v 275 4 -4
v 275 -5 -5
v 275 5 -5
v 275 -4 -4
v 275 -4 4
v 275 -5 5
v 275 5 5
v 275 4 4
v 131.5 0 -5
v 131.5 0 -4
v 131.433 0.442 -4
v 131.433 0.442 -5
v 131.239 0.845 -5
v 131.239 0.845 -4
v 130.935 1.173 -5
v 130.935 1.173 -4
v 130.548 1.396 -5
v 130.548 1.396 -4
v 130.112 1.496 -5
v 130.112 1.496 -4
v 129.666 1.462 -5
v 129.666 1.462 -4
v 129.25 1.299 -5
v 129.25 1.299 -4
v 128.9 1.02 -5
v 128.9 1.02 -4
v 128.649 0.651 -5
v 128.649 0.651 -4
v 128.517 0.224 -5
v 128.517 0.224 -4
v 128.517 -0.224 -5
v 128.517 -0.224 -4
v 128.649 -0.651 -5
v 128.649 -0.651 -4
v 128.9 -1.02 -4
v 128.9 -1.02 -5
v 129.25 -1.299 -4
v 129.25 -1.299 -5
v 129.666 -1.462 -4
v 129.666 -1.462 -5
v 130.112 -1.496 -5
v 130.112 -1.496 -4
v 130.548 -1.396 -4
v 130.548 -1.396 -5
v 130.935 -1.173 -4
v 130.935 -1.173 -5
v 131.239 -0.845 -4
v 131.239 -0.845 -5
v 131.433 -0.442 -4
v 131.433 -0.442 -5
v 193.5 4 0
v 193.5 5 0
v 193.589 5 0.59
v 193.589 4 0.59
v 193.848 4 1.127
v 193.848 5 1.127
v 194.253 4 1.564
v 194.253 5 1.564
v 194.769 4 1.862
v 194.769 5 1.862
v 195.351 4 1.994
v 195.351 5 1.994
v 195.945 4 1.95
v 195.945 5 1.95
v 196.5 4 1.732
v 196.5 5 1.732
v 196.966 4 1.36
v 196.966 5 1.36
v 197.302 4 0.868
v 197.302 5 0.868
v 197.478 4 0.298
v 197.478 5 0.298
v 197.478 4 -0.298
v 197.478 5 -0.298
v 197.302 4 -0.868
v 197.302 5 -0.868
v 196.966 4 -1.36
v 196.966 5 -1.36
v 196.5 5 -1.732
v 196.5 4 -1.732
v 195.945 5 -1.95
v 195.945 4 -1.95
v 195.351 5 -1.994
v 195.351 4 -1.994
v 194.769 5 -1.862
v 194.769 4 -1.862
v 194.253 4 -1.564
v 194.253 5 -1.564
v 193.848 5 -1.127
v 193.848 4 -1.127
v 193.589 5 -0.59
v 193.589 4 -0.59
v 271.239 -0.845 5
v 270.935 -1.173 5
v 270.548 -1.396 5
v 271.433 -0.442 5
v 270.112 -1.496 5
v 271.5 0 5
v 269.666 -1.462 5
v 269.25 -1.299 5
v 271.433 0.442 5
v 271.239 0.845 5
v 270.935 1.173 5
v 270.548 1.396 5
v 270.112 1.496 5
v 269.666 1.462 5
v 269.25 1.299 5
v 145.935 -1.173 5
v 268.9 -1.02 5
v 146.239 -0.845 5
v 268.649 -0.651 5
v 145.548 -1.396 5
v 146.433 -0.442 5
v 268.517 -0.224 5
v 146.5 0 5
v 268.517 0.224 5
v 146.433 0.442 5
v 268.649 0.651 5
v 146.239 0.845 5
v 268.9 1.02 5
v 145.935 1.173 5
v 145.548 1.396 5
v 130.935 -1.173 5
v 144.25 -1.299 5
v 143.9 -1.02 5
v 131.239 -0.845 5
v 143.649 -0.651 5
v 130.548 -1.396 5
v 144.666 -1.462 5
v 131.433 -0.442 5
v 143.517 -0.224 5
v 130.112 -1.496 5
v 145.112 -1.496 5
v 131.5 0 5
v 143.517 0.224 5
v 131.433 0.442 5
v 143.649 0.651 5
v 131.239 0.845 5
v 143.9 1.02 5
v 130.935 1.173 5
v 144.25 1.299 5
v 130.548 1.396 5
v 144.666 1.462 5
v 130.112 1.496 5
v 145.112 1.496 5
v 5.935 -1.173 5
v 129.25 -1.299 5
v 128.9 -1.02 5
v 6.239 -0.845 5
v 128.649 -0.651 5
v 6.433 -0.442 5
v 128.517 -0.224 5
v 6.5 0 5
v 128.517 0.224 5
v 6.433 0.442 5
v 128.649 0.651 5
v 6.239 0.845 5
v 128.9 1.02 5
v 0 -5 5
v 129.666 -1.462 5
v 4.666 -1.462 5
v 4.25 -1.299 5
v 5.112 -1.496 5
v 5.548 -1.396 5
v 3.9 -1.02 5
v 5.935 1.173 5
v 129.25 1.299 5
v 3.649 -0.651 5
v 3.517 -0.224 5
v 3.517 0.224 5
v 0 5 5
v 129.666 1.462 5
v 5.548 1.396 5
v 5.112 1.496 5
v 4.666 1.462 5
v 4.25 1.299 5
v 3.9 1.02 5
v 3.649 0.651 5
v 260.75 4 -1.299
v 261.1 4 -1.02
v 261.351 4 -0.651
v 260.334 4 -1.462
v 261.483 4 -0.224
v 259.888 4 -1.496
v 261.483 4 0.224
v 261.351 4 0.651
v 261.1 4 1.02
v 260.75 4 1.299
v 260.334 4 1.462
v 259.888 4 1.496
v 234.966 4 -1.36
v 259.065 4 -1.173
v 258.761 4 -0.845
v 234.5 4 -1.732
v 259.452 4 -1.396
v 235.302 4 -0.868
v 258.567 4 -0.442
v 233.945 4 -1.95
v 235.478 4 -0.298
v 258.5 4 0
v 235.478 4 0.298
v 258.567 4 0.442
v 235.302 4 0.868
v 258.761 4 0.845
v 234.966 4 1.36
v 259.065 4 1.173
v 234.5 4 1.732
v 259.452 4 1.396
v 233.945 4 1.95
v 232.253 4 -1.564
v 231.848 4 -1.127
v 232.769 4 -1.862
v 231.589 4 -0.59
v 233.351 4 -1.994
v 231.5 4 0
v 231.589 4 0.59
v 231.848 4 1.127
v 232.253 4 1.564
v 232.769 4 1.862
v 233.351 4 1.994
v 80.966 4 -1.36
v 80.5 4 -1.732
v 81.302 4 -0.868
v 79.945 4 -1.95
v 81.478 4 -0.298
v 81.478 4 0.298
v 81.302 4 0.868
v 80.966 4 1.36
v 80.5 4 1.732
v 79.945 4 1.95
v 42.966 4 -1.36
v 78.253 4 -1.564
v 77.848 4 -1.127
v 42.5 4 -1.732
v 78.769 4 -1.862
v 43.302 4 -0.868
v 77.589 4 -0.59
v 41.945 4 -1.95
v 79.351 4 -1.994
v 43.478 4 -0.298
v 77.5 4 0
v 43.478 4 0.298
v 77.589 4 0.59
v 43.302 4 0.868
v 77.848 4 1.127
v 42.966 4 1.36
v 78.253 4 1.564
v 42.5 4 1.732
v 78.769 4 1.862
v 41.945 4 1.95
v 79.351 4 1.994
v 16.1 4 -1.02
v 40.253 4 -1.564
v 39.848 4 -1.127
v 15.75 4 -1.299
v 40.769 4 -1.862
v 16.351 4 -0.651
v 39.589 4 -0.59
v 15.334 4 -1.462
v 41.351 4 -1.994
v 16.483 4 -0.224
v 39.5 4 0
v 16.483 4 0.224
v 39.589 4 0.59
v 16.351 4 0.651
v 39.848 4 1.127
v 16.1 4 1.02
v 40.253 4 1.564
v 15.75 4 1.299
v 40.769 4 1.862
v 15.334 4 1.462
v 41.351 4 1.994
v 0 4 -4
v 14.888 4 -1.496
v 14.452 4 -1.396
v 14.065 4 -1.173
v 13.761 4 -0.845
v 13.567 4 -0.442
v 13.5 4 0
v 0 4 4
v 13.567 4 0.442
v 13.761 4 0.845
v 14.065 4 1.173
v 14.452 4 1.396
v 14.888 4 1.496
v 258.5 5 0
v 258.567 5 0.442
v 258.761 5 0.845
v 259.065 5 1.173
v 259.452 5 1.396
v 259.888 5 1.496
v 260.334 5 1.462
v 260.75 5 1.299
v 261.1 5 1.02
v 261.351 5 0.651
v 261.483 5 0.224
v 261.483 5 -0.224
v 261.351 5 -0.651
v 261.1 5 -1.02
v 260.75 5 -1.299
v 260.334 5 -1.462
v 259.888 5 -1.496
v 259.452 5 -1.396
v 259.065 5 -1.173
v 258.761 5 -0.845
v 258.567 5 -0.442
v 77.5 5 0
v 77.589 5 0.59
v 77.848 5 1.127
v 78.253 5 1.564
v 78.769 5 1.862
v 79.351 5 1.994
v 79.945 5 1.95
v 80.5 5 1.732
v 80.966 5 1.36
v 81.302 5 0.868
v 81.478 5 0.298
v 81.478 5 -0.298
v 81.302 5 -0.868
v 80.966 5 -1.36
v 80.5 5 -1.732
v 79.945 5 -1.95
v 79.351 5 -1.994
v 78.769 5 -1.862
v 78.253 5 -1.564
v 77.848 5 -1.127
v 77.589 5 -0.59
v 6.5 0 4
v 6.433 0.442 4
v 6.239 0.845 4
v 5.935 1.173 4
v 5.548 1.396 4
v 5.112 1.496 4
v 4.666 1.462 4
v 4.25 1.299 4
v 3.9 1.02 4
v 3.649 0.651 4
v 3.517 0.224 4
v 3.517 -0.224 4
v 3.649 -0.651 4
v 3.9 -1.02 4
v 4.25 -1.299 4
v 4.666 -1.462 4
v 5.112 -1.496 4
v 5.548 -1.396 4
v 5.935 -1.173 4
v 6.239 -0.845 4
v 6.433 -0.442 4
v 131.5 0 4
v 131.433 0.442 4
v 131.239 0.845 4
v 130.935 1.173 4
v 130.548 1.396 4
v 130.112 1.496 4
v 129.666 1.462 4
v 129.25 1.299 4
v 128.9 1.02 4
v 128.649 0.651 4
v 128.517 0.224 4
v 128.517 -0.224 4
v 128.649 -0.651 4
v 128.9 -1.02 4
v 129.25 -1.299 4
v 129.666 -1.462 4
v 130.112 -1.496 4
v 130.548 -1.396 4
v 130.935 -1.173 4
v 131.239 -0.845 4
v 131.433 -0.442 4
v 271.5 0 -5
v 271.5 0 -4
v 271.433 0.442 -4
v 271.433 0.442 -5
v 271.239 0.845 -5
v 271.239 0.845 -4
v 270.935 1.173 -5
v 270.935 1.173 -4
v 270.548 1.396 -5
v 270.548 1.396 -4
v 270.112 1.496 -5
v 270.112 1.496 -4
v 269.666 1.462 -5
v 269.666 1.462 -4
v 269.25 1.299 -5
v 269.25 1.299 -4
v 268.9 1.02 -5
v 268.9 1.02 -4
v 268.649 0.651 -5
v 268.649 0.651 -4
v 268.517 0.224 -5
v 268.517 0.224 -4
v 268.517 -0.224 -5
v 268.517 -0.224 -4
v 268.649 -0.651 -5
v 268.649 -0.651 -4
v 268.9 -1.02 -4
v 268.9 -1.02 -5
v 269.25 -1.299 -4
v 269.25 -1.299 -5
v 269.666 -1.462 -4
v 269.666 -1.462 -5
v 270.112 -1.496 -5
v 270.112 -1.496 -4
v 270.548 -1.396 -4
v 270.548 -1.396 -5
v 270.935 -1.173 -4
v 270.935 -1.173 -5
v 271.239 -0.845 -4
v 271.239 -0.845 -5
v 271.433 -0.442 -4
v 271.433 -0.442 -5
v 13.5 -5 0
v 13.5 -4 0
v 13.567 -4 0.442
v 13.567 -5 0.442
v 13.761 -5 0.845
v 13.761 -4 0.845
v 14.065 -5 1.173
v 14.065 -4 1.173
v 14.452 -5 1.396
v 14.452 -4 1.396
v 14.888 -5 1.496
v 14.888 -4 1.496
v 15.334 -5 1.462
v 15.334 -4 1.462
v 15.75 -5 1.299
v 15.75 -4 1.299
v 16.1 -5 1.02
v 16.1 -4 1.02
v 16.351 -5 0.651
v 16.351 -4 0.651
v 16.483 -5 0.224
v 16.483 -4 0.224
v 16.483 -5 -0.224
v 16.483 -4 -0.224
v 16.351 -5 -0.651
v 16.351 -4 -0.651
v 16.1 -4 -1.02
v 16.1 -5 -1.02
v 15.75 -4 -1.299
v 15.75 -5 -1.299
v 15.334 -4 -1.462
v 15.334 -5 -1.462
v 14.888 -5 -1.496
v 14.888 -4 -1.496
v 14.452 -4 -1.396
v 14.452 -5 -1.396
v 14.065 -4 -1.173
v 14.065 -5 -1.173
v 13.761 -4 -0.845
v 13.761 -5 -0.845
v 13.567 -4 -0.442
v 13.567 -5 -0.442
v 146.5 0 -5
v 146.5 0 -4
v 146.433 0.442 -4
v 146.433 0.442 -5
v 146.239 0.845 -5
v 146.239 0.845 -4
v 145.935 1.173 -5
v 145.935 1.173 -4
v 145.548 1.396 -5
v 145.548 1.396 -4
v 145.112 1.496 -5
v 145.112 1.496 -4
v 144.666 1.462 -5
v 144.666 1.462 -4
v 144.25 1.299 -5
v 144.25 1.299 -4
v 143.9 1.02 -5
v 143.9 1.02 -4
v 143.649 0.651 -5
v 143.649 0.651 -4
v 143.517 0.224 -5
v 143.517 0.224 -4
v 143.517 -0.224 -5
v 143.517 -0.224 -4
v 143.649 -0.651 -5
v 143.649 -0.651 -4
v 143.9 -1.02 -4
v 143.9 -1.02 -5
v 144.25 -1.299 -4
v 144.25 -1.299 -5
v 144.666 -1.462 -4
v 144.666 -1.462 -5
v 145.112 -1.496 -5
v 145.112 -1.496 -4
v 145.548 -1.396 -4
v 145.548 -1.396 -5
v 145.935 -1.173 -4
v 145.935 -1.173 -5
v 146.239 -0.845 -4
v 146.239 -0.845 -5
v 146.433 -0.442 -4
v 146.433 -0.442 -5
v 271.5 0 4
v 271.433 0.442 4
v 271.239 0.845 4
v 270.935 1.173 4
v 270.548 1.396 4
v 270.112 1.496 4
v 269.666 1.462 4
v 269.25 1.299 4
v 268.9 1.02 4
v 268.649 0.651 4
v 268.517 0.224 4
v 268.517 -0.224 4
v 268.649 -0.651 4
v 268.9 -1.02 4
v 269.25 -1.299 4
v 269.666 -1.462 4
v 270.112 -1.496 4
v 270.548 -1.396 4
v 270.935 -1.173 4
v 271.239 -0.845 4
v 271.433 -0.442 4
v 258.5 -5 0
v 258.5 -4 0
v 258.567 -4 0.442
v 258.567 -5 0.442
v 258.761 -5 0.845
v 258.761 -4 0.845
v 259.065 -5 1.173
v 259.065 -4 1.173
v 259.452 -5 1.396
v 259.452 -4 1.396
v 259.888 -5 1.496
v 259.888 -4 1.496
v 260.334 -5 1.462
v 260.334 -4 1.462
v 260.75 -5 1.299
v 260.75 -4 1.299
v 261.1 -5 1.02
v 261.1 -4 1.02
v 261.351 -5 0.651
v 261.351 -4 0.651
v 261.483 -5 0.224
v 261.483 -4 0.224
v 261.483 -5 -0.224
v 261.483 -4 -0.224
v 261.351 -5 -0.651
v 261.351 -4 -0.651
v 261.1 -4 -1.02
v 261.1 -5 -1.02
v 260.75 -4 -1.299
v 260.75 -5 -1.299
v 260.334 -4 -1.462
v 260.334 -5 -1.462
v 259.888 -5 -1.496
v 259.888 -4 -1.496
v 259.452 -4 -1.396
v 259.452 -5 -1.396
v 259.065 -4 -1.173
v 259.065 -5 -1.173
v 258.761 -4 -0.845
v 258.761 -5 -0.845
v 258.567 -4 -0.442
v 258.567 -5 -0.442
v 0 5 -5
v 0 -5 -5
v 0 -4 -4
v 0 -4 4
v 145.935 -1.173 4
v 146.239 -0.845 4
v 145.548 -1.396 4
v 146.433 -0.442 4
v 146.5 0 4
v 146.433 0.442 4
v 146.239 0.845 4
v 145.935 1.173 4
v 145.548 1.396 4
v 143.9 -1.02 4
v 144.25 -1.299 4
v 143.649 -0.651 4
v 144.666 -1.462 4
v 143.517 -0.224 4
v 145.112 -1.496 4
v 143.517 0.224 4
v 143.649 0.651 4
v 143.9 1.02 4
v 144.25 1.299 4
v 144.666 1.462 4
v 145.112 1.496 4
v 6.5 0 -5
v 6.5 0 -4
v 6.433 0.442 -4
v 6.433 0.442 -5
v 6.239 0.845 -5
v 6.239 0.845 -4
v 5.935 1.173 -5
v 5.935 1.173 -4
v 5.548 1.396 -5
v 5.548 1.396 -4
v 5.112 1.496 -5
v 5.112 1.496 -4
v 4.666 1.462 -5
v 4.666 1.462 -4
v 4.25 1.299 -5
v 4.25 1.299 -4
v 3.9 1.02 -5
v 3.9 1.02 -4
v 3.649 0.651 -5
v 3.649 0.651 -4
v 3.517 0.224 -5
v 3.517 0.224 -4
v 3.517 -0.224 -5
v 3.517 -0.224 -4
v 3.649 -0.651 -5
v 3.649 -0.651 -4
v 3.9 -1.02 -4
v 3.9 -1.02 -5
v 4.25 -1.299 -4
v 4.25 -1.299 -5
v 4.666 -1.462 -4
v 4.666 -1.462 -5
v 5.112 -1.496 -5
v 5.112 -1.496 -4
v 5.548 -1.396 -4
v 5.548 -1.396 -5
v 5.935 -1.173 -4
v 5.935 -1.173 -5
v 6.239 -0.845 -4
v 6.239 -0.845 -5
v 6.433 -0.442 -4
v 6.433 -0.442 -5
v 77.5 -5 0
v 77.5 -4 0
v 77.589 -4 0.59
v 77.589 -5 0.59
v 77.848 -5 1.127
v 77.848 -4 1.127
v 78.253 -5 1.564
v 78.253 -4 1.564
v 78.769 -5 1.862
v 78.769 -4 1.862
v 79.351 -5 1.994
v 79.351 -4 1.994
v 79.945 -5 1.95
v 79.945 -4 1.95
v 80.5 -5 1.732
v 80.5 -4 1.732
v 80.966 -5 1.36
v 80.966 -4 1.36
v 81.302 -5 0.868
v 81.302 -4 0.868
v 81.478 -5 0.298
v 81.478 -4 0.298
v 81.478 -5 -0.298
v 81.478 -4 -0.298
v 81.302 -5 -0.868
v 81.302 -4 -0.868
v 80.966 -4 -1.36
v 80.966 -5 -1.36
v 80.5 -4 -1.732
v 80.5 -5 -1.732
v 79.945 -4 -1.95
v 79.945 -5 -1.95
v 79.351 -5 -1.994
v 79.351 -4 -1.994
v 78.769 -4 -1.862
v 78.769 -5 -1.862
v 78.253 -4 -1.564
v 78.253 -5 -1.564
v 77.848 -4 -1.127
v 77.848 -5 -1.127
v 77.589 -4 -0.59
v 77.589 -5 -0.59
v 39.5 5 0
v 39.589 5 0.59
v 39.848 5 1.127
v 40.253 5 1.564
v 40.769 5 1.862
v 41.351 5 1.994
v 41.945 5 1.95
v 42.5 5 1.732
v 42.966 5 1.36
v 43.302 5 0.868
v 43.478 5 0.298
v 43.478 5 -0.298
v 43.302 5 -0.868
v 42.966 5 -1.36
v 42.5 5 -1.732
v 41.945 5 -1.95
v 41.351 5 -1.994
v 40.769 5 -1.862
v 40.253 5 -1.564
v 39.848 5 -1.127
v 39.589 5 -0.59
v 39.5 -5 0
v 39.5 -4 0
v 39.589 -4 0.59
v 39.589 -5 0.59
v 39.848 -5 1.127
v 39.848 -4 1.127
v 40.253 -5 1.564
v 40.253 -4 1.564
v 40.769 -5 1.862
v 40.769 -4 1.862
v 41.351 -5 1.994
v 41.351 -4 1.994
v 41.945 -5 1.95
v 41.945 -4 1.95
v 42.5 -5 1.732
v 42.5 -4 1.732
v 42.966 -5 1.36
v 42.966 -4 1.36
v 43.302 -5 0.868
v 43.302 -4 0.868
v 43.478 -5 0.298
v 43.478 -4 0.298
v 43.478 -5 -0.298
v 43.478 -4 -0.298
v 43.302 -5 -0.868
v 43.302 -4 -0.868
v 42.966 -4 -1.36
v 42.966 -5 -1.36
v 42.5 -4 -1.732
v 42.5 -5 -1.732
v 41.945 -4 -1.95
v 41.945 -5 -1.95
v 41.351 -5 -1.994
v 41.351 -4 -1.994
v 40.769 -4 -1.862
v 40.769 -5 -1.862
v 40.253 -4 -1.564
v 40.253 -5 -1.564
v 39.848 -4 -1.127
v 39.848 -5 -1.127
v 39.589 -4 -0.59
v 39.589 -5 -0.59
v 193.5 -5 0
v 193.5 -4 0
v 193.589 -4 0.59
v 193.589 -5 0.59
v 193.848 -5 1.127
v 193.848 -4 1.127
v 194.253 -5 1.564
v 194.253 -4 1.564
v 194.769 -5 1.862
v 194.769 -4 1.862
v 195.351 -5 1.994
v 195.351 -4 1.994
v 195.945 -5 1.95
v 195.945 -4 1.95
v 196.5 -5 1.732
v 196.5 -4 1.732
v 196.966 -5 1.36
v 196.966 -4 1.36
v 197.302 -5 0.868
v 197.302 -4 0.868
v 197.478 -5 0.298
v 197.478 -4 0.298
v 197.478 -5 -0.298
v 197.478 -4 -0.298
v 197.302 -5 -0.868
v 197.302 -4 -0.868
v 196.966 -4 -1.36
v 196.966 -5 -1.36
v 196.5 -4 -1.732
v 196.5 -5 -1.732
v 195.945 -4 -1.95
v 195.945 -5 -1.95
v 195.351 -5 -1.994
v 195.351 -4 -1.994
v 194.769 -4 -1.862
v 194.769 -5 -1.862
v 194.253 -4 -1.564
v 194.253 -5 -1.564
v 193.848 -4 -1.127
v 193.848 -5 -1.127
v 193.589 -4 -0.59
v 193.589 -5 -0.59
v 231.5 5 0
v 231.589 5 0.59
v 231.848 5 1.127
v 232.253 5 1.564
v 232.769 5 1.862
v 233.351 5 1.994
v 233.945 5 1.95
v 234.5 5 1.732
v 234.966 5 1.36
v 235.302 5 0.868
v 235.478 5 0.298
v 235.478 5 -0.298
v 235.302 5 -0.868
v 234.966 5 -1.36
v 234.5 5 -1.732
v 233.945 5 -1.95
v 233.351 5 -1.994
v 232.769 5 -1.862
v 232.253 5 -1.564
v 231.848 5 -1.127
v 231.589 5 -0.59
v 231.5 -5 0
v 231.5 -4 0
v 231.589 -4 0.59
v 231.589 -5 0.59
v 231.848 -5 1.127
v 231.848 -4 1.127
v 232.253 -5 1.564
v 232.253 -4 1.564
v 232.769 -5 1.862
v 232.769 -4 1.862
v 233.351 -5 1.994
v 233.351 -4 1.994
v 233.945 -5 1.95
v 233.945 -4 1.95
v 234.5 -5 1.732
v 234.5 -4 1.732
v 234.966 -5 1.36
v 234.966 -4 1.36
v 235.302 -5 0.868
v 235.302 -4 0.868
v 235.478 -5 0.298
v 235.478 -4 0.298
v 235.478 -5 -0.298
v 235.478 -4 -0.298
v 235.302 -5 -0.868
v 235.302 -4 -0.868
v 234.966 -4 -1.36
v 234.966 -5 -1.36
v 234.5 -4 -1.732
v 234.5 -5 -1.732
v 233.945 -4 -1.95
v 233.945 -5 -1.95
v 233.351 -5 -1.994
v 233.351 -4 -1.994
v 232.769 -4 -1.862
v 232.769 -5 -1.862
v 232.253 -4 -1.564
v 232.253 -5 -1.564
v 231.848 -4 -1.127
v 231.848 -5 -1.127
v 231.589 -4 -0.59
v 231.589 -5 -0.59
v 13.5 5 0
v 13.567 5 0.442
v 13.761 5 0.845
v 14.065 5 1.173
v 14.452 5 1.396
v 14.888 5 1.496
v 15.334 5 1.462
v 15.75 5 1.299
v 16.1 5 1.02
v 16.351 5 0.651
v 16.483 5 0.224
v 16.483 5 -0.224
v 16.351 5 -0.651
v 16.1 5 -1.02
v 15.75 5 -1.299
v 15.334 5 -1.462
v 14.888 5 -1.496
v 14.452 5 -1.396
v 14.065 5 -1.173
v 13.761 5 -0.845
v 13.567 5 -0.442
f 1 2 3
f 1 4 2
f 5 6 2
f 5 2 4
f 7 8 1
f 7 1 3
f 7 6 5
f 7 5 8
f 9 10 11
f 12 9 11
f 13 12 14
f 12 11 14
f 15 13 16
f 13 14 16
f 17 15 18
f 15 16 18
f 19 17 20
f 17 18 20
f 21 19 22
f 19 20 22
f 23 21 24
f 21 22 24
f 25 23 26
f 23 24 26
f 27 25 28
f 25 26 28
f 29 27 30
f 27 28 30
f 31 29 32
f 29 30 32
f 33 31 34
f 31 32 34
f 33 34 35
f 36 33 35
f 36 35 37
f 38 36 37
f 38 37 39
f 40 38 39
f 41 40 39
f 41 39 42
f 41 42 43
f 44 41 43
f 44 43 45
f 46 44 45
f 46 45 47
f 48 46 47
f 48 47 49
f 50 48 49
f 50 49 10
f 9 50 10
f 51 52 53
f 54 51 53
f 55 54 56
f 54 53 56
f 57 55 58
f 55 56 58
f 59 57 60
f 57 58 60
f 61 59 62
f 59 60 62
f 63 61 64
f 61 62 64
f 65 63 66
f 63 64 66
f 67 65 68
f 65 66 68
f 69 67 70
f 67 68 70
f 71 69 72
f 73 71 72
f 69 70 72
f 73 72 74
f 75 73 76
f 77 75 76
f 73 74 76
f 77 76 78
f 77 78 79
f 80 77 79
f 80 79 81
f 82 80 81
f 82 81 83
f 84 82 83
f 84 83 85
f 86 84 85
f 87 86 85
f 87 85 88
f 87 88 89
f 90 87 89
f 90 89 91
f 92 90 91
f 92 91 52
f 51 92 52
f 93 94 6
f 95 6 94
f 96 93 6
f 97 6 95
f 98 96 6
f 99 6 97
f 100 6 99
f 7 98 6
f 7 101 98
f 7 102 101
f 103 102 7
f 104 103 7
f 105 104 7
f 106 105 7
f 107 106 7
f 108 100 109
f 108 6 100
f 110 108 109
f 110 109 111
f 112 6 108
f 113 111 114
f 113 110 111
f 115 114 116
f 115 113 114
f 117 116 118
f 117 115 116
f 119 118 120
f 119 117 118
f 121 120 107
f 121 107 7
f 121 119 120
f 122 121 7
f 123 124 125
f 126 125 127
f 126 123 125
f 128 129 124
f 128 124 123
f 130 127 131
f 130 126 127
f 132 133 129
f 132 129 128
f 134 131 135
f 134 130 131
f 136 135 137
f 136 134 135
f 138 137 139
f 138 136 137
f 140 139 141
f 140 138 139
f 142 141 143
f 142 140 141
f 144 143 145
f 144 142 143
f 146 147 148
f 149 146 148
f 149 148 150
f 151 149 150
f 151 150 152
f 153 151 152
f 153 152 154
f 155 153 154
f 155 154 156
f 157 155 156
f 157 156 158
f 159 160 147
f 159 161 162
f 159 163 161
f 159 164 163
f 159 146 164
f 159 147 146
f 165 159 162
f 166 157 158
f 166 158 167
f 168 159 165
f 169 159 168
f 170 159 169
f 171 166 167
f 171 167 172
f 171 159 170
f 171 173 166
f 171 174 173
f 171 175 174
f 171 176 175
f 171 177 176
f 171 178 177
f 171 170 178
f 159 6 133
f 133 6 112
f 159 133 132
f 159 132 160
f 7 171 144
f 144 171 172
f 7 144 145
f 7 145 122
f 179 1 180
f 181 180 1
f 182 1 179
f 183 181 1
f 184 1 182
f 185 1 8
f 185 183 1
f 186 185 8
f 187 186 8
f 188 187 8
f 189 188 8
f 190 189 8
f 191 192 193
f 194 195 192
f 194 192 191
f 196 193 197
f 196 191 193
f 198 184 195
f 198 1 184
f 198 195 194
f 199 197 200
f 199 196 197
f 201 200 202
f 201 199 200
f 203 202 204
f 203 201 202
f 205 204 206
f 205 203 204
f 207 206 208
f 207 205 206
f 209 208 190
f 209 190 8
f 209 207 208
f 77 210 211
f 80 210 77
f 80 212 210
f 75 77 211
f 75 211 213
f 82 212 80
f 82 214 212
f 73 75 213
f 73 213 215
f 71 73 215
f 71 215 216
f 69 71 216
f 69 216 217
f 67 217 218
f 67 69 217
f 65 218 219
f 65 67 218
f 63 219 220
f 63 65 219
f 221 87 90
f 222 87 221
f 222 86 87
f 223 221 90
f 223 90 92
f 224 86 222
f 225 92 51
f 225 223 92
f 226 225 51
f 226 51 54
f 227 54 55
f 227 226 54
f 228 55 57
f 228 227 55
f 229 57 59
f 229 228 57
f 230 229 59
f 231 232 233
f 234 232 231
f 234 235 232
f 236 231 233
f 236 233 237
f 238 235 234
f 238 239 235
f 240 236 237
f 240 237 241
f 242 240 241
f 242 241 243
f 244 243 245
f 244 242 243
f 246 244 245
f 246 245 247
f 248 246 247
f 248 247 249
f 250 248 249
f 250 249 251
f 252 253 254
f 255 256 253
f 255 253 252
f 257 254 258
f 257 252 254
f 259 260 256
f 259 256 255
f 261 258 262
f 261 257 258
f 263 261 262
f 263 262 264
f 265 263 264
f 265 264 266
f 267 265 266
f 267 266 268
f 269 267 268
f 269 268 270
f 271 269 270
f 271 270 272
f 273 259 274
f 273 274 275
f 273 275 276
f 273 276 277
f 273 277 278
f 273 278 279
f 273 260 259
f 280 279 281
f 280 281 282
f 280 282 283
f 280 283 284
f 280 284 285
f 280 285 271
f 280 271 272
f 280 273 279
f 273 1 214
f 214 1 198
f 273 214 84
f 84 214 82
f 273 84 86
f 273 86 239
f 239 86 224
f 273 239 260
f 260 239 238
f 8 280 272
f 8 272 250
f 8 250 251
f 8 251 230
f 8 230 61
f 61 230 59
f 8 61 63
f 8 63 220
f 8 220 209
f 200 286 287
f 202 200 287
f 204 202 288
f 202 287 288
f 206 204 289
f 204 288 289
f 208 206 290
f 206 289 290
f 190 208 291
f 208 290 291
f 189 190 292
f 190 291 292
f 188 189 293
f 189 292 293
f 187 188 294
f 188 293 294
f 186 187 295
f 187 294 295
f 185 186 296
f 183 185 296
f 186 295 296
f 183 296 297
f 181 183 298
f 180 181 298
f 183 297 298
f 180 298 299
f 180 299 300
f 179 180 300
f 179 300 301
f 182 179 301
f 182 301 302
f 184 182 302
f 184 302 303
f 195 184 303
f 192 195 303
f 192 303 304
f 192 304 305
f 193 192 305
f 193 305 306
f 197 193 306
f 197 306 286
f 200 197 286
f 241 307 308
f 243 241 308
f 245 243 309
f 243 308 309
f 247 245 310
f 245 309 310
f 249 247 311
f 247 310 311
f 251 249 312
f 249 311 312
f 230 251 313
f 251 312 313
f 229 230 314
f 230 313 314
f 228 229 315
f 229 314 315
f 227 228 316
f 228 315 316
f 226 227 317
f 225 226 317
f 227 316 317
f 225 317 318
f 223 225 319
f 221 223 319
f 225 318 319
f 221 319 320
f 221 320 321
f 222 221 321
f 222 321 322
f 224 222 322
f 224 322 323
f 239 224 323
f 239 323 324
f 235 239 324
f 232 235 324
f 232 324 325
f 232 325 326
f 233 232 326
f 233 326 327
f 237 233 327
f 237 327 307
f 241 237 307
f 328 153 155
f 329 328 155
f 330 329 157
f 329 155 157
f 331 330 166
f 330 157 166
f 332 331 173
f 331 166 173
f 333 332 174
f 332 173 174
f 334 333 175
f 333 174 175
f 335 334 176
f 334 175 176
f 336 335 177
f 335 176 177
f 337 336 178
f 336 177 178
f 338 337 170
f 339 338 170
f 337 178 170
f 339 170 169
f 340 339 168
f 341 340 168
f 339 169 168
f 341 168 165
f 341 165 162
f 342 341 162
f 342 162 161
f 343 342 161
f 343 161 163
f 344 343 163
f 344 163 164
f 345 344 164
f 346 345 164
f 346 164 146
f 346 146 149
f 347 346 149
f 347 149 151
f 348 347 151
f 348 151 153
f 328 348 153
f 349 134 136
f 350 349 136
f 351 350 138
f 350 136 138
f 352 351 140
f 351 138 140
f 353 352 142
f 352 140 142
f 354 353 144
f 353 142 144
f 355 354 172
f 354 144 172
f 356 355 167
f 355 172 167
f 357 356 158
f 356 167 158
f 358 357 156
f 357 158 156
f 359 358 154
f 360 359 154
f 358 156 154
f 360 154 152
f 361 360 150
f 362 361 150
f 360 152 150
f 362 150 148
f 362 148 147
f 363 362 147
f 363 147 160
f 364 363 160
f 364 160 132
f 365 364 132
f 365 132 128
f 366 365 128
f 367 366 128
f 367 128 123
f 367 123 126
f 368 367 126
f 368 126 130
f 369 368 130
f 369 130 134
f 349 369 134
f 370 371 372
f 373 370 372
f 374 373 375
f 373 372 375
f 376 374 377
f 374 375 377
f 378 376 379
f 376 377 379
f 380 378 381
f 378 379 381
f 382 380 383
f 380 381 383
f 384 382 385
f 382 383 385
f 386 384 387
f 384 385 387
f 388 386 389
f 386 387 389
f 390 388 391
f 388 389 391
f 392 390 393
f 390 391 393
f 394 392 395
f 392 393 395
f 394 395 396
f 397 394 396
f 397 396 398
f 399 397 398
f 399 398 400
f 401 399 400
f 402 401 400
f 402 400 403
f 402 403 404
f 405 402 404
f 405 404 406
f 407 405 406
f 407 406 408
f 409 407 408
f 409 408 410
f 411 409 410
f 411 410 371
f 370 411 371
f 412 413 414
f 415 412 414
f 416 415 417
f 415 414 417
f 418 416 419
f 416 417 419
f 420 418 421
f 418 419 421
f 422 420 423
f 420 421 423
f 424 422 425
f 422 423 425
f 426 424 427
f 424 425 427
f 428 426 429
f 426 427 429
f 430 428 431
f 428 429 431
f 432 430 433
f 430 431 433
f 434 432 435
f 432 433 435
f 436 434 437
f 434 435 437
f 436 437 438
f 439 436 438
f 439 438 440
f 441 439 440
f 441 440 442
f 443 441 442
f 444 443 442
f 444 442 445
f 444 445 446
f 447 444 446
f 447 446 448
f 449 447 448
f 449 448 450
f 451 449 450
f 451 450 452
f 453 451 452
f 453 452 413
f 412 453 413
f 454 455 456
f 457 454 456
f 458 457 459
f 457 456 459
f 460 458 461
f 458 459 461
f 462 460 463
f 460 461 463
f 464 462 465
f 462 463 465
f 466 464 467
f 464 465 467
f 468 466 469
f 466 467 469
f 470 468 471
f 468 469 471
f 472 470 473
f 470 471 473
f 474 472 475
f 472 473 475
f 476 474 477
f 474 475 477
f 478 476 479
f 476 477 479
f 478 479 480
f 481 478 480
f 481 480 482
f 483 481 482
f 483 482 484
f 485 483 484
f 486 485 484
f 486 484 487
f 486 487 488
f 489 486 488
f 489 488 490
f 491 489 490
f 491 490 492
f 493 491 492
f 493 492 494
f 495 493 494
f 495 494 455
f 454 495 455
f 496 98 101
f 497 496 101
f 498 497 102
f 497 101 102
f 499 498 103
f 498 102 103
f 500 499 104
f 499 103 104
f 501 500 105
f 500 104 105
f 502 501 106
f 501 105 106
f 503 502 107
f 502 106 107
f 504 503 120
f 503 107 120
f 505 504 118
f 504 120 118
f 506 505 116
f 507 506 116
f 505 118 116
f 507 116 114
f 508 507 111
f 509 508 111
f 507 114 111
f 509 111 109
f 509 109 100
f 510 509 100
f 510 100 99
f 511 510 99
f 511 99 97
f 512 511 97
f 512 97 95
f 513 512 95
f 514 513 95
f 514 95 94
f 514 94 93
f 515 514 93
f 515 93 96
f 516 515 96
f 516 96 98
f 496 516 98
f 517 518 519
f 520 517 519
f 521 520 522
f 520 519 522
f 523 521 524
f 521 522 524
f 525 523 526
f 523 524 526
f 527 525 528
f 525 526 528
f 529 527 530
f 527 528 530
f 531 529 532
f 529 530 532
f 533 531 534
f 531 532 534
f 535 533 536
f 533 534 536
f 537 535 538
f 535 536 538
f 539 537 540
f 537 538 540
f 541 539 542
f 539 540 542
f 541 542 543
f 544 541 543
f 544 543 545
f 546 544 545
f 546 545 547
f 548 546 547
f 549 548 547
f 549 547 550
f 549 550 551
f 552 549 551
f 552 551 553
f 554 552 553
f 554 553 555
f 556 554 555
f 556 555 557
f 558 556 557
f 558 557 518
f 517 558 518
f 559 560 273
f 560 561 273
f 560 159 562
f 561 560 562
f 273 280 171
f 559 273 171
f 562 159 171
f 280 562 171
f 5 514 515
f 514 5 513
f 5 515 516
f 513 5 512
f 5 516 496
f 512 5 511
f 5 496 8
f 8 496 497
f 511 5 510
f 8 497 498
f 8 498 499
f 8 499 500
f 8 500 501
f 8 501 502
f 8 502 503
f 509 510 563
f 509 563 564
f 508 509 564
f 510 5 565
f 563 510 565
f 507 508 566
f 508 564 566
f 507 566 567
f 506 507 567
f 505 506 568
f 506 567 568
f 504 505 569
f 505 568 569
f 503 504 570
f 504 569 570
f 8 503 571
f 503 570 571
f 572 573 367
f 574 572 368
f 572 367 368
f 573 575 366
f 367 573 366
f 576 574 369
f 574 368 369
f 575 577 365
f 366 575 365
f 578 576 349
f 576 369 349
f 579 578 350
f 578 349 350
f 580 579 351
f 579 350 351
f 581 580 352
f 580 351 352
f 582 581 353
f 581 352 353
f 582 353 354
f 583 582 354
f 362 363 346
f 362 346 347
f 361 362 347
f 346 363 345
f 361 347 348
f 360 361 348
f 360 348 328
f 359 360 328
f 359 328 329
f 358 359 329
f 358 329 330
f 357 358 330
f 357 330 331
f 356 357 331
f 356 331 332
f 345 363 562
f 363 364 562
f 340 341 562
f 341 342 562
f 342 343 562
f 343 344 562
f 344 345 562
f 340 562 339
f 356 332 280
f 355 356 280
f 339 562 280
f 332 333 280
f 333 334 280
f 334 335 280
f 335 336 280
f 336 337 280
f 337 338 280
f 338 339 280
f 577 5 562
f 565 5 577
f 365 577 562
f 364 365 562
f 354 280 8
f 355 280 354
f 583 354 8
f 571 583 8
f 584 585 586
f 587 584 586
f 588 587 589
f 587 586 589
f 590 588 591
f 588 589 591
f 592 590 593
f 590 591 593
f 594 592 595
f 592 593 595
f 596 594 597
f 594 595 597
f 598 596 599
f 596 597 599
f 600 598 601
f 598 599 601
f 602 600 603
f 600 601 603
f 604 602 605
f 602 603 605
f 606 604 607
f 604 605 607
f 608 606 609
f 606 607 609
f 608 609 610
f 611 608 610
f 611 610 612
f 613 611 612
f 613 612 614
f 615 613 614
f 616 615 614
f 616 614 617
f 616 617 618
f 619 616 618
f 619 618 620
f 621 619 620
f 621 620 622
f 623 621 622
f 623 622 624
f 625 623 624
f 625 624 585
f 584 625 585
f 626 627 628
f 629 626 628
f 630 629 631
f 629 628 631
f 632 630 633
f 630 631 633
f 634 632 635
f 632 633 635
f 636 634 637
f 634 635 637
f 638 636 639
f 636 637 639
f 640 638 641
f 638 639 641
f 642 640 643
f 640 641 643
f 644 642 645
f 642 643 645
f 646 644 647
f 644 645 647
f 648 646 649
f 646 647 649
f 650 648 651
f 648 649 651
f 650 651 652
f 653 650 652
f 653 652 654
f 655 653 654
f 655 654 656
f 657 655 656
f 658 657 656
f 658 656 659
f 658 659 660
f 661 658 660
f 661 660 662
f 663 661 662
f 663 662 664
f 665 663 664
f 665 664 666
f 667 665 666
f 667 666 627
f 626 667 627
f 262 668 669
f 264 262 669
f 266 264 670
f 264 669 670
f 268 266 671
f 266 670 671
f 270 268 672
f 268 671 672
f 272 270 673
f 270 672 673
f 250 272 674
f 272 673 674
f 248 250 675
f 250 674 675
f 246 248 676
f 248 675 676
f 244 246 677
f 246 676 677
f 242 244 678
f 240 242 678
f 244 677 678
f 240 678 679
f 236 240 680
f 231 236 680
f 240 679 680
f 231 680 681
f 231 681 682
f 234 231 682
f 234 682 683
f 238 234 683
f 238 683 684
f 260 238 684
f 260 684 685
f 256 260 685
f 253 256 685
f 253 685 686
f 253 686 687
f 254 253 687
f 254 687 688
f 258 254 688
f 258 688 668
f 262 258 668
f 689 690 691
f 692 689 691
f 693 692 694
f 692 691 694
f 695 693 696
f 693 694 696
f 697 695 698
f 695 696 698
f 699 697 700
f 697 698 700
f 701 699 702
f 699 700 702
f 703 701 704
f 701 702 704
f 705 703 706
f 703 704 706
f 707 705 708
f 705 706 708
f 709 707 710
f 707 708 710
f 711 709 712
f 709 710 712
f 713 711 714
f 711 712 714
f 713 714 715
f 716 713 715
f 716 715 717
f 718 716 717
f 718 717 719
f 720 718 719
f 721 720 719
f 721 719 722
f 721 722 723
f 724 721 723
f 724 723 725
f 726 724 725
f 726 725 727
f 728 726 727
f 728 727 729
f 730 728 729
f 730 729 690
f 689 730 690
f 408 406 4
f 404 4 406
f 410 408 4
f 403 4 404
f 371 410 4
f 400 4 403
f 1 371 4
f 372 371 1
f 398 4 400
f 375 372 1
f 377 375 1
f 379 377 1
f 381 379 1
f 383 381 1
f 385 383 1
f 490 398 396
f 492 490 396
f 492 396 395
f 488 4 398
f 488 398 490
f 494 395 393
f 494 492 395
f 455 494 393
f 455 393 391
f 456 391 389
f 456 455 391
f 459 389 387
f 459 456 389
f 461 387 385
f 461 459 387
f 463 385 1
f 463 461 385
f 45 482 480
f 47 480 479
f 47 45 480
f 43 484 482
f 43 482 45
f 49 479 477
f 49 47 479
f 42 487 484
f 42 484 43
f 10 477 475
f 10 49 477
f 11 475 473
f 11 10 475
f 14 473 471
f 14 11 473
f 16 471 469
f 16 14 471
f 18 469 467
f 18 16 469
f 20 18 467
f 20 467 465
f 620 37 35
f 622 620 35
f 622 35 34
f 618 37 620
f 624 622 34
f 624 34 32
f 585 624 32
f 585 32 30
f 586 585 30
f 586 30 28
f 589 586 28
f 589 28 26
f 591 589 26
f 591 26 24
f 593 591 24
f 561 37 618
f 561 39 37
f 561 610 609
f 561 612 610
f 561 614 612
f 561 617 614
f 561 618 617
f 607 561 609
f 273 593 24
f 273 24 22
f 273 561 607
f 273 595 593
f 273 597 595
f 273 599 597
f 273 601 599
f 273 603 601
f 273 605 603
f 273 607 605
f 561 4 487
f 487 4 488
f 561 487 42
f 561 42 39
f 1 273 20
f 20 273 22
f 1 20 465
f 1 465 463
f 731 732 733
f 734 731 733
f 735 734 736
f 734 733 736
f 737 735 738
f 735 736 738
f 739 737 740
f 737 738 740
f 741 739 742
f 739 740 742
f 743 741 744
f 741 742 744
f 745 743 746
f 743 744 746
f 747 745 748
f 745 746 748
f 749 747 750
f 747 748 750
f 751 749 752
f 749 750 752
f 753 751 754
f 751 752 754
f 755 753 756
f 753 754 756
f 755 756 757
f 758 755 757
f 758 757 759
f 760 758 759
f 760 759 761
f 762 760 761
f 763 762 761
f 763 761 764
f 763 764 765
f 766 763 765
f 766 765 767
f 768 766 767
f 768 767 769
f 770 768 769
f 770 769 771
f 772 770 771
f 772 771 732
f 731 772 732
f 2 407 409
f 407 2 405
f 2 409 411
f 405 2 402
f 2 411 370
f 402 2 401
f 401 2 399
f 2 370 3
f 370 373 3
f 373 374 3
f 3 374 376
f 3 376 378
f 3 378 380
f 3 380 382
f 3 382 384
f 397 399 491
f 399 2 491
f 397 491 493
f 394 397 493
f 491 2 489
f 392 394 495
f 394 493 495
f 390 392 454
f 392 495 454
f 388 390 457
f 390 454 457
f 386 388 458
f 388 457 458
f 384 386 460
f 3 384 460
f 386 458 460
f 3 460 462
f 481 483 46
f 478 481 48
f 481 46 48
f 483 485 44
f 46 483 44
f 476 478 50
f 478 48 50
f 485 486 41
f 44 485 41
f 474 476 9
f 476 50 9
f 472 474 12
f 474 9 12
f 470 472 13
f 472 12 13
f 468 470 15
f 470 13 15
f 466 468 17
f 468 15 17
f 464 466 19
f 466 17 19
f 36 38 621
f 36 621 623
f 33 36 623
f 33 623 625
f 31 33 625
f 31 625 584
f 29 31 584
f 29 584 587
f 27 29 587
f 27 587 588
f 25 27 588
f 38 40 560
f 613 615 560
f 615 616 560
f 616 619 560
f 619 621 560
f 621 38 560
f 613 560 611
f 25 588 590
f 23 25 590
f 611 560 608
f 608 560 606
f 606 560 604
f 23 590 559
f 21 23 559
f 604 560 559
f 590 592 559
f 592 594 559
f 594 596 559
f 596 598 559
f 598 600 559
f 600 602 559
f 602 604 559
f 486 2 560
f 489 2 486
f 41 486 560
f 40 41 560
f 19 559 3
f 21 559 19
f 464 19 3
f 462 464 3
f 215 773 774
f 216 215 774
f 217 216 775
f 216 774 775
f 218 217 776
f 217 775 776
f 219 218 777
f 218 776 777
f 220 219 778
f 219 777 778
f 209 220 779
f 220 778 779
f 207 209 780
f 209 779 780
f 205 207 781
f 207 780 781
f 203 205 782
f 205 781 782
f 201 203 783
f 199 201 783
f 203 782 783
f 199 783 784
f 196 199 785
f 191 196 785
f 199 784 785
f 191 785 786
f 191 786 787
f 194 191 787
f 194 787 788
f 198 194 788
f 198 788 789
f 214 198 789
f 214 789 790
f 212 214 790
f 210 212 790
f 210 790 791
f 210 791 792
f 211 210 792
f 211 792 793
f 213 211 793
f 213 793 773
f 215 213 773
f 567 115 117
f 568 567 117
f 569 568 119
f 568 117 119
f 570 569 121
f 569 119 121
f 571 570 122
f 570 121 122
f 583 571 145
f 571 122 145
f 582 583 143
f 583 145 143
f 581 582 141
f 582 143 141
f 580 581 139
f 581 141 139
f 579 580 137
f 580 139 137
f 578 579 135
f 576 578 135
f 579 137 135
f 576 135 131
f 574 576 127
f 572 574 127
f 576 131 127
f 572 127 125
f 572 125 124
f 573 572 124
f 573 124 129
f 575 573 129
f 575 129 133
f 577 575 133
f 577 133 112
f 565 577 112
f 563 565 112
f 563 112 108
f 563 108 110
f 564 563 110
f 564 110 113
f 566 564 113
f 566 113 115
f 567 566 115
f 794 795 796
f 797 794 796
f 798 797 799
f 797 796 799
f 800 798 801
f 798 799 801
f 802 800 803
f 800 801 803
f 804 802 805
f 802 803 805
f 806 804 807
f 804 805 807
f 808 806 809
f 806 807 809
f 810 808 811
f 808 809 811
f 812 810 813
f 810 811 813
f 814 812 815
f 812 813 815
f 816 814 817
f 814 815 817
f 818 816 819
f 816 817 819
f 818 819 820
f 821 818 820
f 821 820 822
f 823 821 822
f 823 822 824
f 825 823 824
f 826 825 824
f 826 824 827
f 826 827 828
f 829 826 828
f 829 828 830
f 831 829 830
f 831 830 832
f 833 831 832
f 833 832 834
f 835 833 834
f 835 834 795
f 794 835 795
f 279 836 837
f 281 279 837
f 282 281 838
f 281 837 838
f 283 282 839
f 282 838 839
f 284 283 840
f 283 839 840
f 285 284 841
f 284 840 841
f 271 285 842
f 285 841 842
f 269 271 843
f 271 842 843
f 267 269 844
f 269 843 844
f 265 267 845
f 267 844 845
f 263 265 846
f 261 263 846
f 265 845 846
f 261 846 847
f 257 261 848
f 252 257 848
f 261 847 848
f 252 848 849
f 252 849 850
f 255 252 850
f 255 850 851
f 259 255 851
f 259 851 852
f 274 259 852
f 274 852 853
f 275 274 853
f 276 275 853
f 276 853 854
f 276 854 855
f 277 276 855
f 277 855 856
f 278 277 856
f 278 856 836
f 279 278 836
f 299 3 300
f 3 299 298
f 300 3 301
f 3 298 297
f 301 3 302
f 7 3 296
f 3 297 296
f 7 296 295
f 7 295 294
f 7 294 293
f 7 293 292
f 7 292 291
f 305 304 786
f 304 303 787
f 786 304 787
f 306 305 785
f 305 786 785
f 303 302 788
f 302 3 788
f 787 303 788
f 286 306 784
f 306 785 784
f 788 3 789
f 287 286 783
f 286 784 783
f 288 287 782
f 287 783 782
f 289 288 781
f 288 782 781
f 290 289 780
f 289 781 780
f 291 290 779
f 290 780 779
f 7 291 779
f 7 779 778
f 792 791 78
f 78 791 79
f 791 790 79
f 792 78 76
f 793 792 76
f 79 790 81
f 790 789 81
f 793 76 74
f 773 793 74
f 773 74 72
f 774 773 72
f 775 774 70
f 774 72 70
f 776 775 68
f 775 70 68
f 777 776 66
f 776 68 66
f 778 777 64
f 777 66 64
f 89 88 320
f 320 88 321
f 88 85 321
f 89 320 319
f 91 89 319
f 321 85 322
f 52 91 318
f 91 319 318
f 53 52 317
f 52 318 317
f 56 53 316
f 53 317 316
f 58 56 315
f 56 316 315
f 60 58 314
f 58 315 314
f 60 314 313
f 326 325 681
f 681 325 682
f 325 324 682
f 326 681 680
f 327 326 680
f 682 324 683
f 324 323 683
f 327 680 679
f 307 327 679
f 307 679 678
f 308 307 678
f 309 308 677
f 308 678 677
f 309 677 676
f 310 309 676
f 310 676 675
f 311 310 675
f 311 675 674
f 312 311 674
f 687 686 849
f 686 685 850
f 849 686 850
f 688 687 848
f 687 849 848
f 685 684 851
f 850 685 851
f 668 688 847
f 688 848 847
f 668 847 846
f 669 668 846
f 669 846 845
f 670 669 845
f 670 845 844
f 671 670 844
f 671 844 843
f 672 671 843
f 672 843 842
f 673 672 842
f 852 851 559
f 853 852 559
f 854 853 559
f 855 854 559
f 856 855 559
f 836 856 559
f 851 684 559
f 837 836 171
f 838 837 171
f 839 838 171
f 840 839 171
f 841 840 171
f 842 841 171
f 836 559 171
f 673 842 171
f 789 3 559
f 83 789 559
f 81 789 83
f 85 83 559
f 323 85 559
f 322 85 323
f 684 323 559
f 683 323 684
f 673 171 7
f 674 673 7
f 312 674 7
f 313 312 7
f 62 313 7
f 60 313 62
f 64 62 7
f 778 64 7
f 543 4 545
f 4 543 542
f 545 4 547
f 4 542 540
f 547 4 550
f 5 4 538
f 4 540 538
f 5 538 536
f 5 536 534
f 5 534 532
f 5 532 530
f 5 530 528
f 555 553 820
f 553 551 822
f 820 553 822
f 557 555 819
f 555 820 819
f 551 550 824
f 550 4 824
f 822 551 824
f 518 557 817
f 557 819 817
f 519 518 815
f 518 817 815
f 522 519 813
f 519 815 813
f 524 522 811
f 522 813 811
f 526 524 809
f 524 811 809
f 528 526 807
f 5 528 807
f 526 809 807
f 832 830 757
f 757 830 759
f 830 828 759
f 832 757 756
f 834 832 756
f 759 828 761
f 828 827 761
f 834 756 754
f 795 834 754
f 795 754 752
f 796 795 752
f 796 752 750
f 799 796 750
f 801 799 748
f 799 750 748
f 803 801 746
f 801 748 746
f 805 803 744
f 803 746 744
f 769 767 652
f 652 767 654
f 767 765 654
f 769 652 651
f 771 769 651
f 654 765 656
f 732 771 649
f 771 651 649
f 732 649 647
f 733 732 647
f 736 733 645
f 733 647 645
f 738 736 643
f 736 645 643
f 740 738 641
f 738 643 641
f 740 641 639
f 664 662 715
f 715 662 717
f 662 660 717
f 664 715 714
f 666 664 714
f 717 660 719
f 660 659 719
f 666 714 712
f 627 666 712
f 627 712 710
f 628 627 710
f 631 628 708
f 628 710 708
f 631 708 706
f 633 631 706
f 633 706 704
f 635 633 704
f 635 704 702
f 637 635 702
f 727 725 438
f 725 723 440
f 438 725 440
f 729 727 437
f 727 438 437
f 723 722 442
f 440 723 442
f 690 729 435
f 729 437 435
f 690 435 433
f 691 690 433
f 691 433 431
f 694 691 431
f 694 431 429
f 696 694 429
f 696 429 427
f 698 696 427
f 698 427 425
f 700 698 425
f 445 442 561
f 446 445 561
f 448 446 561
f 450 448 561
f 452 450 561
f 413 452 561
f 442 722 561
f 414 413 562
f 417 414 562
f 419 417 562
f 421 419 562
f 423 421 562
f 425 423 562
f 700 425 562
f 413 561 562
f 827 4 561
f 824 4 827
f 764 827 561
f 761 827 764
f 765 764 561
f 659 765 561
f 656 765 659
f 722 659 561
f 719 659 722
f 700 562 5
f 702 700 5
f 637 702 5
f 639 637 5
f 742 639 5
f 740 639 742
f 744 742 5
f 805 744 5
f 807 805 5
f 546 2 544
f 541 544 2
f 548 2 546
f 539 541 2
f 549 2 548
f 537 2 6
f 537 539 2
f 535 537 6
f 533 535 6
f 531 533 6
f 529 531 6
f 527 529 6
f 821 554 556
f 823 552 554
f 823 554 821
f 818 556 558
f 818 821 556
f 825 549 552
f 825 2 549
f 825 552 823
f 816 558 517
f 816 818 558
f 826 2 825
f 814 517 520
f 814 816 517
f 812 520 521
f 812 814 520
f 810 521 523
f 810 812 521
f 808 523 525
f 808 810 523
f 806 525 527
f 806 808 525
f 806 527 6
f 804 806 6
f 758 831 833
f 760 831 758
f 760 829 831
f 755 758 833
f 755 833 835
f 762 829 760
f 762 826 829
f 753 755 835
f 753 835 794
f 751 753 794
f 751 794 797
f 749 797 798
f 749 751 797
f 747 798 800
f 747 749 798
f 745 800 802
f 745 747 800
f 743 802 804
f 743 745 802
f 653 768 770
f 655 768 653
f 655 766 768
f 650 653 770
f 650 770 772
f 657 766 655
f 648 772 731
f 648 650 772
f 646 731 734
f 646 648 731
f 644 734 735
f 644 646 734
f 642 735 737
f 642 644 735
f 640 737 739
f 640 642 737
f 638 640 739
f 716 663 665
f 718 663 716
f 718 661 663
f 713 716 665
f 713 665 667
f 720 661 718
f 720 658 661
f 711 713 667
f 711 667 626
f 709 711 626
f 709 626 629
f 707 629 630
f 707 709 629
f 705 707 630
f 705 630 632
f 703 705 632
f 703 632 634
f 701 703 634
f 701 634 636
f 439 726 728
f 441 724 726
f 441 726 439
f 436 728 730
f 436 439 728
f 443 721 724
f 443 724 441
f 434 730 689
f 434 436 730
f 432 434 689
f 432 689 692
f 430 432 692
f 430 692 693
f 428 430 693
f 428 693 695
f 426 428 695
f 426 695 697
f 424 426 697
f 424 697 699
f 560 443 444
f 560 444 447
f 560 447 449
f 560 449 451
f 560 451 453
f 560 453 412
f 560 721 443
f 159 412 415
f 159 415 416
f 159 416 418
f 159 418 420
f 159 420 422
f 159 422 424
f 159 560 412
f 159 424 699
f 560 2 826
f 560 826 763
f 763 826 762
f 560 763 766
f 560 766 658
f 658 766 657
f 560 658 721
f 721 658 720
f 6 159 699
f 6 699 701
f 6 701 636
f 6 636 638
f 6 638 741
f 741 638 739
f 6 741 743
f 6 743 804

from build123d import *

# Parameters (mm, degrees)
F0_W     = 10
F0_H     = 10
F0_W_2   = 8
F0_H_2   = 8
F1_DEPTH = 275
F2_R     = 1.5
F3_DEPTH = 25
F4_R     = 2
F4_R_2   = 1.5
F5_DEPTH = 25


with BuildPart() as f1:
    # F0 (on Right) → F1 (new body)
    with BuildSketch(Plane.YZ):
        Rectangle(F0_W, F0_H)
        Rectangle(F0_W_2, F0_H_2, mode=Mode.SUBTRACT)
    extrude(amount=F1_DEPTH)

    # F2 (on face) → F3 (cut)
    with BuildSketch(Plane.XY.offset(5)):
        with Locations((130, 0)):
            Circle(F2_R)
        with Locations((5, 0)):
            Circle(F2_R)
        with Locations((145, 0)):
            Circle(F2_R)
        with Locations((270, 0)):
            Circle(F2_R)
    extrude(amount=-F3_DEPTH, mode=Mode.SUBTRACT)

    # F4 (on face) → F5 (cut)
    with BuildSketch(Plane(origin=(0, 5, 0), x_dir=(-1, 0, 0), z_dir=(0, 1, 0))):
        with Locations((-233.5, 0)):
            Circle(F4_R)
        with Locations((-195.5, 0)):
            Circle(F4_R)
        with Locations((-79.5, 0)):
            Circle(F4_R)
        with Locations((-41.5, 0)):
            Circle(F4_R)
        with Locations((-260, 0)):
            Circle(F4_R_2)
        with Locations((-15, 0)):
            Circle(F4_R_2)
    extrude(amount=-F5_DEPTH, mode=Mode.SUBTRACT)


solid = f1.part
